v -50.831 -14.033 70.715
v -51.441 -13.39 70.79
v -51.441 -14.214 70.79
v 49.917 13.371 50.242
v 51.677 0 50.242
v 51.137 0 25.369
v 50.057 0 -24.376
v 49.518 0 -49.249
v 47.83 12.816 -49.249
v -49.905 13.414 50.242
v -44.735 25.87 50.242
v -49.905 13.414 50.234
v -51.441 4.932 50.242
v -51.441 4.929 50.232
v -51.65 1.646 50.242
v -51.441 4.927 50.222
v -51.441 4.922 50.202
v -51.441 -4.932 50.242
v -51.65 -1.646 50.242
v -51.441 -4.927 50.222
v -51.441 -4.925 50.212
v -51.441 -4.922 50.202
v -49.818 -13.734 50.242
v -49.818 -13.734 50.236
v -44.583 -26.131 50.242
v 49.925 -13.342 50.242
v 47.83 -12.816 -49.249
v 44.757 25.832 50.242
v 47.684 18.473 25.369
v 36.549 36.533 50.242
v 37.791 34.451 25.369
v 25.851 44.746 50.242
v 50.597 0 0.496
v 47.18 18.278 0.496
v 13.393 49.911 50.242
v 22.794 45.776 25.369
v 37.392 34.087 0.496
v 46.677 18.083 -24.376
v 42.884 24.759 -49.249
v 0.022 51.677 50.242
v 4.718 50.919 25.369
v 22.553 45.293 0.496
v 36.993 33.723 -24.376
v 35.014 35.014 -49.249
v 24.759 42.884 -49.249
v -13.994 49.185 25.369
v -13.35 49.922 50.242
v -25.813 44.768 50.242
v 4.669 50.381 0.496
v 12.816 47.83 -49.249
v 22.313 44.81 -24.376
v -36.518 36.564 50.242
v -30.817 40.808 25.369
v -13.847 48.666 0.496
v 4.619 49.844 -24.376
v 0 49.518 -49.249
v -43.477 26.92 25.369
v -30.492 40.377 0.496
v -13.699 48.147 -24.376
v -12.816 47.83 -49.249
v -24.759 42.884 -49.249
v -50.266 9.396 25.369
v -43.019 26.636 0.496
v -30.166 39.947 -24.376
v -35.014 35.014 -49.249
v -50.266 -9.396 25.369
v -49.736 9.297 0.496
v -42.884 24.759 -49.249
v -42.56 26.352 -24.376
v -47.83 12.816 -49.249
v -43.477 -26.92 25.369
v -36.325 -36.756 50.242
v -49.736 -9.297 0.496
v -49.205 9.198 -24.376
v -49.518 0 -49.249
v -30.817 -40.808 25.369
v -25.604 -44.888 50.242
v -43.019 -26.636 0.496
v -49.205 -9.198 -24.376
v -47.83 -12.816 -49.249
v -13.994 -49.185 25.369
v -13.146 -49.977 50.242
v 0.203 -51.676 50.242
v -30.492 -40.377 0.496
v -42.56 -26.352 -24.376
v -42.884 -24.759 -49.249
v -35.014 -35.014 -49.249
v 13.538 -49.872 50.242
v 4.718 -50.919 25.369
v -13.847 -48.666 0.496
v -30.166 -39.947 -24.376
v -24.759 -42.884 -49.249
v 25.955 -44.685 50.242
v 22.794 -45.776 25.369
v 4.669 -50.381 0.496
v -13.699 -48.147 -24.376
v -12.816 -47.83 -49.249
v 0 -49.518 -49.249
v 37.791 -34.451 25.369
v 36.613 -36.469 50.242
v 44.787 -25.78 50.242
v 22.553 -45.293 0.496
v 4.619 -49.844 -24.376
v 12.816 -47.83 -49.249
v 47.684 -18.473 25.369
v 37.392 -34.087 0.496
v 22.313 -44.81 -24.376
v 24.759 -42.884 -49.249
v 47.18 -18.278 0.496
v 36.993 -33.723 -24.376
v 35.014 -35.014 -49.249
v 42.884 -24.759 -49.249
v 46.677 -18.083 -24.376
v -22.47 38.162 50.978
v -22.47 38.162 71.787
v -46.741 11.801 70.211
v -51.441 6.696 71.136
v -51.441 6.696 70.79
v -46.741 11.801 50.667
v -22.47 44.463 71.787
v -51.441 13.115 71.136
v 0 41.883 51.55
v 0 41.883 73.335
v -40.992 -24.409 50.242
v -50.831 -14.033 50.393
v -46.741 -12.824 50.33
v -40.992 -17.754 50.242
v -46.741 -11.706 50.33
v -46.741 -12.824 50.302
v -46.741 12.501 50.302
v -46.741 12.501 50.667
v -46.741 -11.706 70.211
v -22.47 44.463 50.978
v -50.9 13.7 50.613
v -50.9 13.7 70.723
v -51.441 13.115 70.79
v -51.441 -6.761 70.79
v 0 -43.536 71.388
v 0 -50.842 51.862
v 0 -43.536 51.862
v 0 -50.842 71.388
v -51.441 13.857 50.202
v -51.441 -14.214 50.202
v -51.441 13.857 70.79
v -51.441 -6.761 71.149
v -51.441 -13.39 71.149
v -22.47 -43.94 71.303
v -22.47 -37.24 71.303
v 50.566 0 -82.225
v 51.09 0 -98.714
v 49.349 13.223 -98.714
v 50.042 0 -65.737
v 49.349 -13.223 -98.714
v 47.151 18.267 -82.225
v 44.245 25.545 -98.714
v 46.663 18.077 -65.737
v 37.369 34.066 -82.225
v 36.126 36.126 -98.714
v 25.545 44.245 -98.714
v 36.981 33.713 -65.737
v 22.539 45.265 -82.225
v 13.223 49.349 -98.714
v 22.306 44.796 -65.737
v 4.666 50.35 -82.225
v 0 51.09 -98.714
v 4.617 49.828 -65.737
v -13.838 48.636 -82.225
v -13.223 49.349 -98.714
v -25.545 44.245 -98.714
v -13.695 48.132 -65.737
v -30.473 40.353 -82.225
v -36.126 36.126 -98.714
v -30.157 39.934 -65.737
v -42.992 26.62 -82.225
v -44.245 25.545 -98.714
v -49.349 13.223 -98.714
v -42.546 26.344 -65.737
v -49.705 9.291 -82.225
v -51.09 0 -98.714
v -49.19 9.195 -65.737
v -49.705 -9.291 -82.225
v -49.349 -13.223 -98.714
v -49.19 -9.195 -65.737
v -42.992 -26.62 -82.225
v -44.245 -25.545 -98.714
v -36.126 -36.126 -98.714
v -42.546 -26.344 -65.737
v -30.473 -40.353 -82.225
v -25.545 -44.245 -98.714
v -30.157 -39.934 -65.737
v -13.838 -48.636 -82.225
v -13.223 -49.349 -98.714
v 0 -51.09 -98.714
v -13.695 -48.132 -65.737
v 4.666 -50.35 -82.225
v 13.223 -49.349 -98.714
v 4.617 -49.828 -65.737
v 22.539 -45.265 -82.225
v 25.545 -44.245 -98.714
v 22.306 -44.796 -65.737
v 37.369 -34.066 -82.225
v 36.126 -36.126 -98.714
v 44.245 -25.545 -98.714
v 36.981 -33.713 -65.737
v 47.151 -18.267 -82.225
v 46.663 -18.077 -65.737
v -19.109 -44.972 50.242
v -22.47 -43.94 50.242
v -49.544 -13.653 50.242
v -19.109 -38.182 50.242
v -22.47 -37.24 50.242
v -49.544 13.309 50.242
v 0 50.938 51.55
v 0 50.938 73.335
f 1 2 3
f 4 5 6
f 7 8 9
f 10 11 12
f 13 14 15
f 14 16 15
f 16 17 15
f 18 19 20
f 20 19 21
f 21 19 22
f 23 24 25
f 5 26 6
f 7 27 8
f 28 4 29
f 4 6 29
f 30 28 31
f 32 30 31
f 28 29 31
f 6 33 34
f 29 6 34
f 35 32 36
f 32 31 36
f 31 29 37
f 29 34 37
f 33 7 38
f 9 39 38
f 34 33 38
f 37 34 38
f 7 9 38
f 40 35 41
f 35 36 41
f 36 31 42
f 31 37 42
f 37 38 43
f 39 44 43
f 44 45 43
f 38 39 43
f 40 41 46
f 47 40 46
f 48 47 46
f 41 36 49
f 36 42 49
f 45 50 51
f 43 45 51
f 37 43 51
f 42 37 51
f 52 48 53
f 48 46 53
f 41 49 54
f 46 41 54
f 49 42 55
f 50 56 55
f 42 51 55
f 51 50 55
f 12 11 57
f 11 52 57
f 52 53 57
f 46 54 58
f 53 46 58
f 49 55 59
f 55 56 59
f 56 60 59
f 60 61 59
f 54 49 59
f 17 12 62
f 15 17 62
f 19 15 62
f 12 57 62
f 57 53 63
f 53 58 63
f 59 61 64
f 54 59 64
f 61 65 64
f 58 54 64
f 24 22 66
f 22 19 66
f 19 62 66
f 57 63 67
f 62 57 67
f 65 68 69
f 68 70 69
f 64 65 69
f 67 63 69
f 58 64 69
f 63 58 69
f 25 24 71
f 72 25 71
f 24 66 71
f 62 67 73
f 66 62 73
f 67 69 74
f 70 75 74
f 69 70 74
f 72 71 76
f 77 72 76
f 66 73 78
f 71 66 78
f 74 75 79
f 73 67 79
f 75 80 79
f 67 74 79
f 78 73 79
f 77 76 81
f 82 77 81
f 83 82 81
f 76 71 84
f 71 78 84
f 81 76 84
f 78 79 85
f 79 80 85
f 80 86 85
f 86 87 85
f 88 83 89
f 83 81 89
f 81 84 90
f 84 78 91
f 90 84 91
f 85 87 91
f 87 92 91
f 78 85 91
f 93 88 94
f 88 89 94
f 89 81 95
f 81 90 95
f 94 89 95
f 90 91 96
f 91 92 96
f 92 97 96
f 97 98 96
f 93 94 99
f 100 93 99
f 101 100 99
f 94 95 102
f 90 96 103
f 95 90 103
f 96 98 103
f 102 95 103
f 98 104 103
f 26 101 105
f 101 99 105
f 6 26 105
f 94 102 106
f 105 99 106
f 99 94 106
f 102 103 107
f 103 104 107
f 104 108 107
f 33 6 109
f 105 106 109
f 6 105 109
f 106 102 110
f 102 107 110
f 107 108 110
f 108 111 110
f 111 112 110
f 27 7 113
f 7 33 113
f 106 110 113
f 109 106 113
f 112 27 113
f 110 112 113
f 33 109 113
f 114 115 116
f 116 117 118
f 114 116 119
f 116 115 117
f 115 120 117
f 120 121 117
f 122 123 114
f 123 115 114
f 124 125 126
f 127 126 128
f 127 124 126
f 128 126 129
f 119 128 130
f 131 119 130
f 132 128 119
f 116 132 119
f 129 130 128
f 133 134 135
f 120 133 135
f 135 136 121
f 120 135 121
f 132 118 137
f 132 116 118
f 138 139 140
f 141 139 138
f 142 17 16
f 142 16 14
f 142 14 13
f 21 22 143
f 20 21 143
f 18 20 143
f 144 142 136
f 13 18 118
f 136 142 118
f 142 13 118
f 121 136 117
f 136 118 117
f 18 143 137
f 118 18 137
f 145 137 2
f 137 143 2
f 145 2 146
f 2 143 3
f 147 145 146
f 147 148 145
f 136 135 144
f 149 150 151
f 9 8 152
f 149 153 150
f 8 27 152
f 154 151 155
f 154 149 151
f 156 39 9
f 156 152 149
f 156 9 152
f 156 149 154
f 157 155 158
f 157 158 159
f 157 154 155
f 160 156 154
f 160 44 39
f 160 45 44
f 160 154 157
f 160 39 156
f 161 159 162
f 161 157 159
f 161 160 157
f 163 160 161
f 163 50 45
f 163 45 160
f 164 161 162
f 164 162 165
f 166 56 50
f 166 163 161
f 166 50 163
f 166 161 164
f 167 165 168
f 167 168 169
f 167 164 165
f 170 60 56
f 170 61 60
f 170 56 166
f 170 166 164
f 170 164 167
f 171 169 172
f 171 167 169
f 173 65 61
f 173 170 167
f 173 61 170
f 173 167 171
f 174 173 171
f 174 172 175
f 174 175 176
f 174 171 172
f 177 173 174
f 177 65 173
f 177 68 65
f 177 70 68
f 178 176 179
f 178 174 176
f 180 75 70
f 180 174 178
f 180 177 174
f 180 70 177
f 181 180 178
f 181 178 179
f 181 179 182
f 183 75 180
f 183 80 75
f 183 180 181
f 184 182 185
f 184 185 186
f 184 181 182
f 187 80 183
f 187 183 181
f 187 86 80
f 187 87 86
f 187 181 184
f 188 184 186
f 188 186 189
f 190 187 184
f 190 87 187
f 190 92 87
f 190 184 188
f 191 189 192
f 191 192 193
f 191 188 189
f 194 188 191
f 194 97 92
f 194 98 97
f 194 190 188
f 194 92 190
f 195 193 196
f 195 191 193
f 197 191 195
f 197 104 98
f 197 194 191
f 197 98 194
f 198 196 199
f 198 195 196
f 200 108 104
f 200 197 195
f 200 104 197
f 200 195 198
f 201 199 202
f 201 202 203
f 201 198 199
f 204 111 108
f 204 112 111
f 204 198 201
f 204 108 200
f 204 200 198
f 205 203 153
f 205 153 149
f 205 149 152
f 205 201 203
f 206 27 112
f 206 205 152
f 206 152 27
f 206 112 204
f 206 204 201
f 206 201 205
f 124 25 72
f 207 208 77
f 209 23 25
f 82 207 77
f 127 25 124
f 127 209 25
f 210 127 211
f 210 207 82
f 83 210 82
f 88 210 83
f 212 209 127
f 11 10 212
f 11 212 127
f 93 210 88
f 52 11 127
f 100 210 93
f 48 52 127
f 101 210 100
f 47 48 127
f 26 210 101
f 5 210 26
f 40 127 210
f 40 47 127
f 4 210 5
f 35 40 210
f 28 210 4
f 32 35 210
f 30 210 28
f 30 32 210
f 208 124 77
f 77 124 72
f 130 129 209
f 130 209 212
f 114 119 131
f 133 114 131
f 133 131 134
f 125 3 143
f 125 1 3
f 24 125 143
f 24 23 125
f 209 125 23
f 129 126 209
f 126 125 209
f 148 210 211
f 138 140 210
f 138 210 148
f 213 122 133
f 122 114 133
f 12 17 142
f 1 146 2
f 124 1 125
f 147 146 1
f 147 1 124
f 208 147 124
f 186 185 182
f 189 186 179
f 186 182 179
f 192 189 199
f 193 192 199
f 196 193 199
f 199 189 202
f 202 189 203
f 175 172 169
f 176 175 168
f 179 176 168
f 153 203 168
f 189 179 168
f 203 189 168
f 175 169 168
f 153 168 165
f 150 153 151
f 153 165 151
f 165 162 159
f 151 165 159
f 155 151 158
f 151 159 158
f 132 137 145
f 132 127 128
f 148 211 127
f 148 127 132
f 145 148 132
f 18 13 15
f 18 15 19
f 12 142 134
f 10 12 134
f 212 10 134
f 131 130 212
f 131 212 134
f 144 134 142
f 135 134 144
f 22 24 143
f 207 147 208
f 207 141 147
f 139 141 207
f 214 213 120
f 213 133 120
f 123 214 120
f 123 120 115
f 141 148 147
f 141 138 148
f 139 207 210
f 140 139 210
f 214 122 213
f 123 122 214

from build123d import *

# Parameters (mm, degrees)
F10_R      = 51.6766678949
F9_R       = 49.5177054899
F14_R      = 51.0900787087
F11_FACE_R = 49.5177054899
F17_W      = 28.0700735748
F17_H      = 20.5879807472
F20_W      = 25.325415656
F20_H      = 19.9093073606
F23_W      = 6.3016116619
F23_H      = 20.8089984953
F22_W      = 6.4192367718
F22_H      = 20.5292478204
F22_W_2    = 6.6290111281
F22_H_2    = 20.7466594875
F23_W_2    = 6.6997222602
F23_H_2    = 21.3462822139
F26_W      = 7.3063448071
F26_H      = 19.5261649787
F28_W      = 9.0555027127
F28_H      = 21.7844322324


with BuildPart() as f11:
    # F10 (on face) → F11 section 0
    with BuildSketch(Plane.XY.offset(50.2420156263)):
        Circle(F10_R)
    # F9 (on face) → F11 section 1
    with BuildSketch(Plane.XY.offset(-49.2490320466)):
        Circle(F9_R)
    loft()

    # F14 (on offset) → F15 section 0
    with BuildSketch(Plane.XY.offset(-98.71355223)):
        Circle(F14_R)
    # F11_face (on face) → F15 section 1
    with BuildSketch(Plane(origin=(0, 0, -49.2490320466), x_dir=(1, 0, 0), z_dir=(0, 0, -1))):
        Circle(F11_FACE_R)
    loft()

    # F17 (on offset) → F21 section 0
    with BuildSketch(Plane.YZ.offset(-51.4408089221)):
        with Locations((-0.1785028726, 60.4957193136)):
            Rectangle(F17_W, F17_H)
    # F20 (on offset) → F21 section 1
    with BuildSketch(Plane.YZ.offset(-46.7405449599)):
        with Locations((-0.1616971567, 60.256190598)):
            Rectangle(F20_W, F20_H)
    loft()

    # F23 (on offset) → F24 section 0
    with BuildSketch(Plane.YZ.offset(-22.4701166153)):
        with Locations((41.3124375045, 61.3829698414)):
            Rectangle(F23_W, F23_H)
    # F22 (on offset) → F24 section 1
    with BuildSketch(Plane.YZ.offset(-51.4408089221)):
        with Locations((9.9052698351, 60.8711652458)):
            Rectangle(F22_W, F22_H)
    loft()

    # F22 (on offset) → F25 section 0
    with BuildSketch(Plane.YZ.offset(-51.4408089221)):
        with Locations((-10.0758362096, 60.7760790735)):
            Rectangle(F22_W_2, F22_H_2)
    # F23 (on offset) → F25 section 1
    with BuildSketch(Plane.YZ.offset(-22.4701166153)):
        with Locations((-40.5898671597, 60.6302414089)):
            Rectangle(F23_W_2, F23_H_2)
    loft()

    # F23 (on offset) → F27 section 0
    with BuildSketch(Plane.YZ.offset(-22.4701166153)):
        with Locations((-40.5898671597, 60.6302414089)):
            Rectangle(F23_W_2, F23_H_2)
    # F26 (on Right) → F27 section 1
    with BuildSketch(Plane.YZ):
        with Locations((-47.1889227629, 61.6251770407)):
            Rectangle(F26_W, F26_H)
    loft()

    # F28 (on Right) → F29 section 0
    with BuildSketch(Plane.YZ):
        with Locations((46.41026631, 62.4425597489)):
            Rectangle(F28_W, F28_H)
    # F23 (on offset) → F29 section 1
    with BuildSketch(Plane.YZ.offset(-22.4701166153)):
        with Locations((41.3124375045, 61.3829698414)):
            Rectangle(F23_W, F23_H)
    loft()


solid = f11.part
